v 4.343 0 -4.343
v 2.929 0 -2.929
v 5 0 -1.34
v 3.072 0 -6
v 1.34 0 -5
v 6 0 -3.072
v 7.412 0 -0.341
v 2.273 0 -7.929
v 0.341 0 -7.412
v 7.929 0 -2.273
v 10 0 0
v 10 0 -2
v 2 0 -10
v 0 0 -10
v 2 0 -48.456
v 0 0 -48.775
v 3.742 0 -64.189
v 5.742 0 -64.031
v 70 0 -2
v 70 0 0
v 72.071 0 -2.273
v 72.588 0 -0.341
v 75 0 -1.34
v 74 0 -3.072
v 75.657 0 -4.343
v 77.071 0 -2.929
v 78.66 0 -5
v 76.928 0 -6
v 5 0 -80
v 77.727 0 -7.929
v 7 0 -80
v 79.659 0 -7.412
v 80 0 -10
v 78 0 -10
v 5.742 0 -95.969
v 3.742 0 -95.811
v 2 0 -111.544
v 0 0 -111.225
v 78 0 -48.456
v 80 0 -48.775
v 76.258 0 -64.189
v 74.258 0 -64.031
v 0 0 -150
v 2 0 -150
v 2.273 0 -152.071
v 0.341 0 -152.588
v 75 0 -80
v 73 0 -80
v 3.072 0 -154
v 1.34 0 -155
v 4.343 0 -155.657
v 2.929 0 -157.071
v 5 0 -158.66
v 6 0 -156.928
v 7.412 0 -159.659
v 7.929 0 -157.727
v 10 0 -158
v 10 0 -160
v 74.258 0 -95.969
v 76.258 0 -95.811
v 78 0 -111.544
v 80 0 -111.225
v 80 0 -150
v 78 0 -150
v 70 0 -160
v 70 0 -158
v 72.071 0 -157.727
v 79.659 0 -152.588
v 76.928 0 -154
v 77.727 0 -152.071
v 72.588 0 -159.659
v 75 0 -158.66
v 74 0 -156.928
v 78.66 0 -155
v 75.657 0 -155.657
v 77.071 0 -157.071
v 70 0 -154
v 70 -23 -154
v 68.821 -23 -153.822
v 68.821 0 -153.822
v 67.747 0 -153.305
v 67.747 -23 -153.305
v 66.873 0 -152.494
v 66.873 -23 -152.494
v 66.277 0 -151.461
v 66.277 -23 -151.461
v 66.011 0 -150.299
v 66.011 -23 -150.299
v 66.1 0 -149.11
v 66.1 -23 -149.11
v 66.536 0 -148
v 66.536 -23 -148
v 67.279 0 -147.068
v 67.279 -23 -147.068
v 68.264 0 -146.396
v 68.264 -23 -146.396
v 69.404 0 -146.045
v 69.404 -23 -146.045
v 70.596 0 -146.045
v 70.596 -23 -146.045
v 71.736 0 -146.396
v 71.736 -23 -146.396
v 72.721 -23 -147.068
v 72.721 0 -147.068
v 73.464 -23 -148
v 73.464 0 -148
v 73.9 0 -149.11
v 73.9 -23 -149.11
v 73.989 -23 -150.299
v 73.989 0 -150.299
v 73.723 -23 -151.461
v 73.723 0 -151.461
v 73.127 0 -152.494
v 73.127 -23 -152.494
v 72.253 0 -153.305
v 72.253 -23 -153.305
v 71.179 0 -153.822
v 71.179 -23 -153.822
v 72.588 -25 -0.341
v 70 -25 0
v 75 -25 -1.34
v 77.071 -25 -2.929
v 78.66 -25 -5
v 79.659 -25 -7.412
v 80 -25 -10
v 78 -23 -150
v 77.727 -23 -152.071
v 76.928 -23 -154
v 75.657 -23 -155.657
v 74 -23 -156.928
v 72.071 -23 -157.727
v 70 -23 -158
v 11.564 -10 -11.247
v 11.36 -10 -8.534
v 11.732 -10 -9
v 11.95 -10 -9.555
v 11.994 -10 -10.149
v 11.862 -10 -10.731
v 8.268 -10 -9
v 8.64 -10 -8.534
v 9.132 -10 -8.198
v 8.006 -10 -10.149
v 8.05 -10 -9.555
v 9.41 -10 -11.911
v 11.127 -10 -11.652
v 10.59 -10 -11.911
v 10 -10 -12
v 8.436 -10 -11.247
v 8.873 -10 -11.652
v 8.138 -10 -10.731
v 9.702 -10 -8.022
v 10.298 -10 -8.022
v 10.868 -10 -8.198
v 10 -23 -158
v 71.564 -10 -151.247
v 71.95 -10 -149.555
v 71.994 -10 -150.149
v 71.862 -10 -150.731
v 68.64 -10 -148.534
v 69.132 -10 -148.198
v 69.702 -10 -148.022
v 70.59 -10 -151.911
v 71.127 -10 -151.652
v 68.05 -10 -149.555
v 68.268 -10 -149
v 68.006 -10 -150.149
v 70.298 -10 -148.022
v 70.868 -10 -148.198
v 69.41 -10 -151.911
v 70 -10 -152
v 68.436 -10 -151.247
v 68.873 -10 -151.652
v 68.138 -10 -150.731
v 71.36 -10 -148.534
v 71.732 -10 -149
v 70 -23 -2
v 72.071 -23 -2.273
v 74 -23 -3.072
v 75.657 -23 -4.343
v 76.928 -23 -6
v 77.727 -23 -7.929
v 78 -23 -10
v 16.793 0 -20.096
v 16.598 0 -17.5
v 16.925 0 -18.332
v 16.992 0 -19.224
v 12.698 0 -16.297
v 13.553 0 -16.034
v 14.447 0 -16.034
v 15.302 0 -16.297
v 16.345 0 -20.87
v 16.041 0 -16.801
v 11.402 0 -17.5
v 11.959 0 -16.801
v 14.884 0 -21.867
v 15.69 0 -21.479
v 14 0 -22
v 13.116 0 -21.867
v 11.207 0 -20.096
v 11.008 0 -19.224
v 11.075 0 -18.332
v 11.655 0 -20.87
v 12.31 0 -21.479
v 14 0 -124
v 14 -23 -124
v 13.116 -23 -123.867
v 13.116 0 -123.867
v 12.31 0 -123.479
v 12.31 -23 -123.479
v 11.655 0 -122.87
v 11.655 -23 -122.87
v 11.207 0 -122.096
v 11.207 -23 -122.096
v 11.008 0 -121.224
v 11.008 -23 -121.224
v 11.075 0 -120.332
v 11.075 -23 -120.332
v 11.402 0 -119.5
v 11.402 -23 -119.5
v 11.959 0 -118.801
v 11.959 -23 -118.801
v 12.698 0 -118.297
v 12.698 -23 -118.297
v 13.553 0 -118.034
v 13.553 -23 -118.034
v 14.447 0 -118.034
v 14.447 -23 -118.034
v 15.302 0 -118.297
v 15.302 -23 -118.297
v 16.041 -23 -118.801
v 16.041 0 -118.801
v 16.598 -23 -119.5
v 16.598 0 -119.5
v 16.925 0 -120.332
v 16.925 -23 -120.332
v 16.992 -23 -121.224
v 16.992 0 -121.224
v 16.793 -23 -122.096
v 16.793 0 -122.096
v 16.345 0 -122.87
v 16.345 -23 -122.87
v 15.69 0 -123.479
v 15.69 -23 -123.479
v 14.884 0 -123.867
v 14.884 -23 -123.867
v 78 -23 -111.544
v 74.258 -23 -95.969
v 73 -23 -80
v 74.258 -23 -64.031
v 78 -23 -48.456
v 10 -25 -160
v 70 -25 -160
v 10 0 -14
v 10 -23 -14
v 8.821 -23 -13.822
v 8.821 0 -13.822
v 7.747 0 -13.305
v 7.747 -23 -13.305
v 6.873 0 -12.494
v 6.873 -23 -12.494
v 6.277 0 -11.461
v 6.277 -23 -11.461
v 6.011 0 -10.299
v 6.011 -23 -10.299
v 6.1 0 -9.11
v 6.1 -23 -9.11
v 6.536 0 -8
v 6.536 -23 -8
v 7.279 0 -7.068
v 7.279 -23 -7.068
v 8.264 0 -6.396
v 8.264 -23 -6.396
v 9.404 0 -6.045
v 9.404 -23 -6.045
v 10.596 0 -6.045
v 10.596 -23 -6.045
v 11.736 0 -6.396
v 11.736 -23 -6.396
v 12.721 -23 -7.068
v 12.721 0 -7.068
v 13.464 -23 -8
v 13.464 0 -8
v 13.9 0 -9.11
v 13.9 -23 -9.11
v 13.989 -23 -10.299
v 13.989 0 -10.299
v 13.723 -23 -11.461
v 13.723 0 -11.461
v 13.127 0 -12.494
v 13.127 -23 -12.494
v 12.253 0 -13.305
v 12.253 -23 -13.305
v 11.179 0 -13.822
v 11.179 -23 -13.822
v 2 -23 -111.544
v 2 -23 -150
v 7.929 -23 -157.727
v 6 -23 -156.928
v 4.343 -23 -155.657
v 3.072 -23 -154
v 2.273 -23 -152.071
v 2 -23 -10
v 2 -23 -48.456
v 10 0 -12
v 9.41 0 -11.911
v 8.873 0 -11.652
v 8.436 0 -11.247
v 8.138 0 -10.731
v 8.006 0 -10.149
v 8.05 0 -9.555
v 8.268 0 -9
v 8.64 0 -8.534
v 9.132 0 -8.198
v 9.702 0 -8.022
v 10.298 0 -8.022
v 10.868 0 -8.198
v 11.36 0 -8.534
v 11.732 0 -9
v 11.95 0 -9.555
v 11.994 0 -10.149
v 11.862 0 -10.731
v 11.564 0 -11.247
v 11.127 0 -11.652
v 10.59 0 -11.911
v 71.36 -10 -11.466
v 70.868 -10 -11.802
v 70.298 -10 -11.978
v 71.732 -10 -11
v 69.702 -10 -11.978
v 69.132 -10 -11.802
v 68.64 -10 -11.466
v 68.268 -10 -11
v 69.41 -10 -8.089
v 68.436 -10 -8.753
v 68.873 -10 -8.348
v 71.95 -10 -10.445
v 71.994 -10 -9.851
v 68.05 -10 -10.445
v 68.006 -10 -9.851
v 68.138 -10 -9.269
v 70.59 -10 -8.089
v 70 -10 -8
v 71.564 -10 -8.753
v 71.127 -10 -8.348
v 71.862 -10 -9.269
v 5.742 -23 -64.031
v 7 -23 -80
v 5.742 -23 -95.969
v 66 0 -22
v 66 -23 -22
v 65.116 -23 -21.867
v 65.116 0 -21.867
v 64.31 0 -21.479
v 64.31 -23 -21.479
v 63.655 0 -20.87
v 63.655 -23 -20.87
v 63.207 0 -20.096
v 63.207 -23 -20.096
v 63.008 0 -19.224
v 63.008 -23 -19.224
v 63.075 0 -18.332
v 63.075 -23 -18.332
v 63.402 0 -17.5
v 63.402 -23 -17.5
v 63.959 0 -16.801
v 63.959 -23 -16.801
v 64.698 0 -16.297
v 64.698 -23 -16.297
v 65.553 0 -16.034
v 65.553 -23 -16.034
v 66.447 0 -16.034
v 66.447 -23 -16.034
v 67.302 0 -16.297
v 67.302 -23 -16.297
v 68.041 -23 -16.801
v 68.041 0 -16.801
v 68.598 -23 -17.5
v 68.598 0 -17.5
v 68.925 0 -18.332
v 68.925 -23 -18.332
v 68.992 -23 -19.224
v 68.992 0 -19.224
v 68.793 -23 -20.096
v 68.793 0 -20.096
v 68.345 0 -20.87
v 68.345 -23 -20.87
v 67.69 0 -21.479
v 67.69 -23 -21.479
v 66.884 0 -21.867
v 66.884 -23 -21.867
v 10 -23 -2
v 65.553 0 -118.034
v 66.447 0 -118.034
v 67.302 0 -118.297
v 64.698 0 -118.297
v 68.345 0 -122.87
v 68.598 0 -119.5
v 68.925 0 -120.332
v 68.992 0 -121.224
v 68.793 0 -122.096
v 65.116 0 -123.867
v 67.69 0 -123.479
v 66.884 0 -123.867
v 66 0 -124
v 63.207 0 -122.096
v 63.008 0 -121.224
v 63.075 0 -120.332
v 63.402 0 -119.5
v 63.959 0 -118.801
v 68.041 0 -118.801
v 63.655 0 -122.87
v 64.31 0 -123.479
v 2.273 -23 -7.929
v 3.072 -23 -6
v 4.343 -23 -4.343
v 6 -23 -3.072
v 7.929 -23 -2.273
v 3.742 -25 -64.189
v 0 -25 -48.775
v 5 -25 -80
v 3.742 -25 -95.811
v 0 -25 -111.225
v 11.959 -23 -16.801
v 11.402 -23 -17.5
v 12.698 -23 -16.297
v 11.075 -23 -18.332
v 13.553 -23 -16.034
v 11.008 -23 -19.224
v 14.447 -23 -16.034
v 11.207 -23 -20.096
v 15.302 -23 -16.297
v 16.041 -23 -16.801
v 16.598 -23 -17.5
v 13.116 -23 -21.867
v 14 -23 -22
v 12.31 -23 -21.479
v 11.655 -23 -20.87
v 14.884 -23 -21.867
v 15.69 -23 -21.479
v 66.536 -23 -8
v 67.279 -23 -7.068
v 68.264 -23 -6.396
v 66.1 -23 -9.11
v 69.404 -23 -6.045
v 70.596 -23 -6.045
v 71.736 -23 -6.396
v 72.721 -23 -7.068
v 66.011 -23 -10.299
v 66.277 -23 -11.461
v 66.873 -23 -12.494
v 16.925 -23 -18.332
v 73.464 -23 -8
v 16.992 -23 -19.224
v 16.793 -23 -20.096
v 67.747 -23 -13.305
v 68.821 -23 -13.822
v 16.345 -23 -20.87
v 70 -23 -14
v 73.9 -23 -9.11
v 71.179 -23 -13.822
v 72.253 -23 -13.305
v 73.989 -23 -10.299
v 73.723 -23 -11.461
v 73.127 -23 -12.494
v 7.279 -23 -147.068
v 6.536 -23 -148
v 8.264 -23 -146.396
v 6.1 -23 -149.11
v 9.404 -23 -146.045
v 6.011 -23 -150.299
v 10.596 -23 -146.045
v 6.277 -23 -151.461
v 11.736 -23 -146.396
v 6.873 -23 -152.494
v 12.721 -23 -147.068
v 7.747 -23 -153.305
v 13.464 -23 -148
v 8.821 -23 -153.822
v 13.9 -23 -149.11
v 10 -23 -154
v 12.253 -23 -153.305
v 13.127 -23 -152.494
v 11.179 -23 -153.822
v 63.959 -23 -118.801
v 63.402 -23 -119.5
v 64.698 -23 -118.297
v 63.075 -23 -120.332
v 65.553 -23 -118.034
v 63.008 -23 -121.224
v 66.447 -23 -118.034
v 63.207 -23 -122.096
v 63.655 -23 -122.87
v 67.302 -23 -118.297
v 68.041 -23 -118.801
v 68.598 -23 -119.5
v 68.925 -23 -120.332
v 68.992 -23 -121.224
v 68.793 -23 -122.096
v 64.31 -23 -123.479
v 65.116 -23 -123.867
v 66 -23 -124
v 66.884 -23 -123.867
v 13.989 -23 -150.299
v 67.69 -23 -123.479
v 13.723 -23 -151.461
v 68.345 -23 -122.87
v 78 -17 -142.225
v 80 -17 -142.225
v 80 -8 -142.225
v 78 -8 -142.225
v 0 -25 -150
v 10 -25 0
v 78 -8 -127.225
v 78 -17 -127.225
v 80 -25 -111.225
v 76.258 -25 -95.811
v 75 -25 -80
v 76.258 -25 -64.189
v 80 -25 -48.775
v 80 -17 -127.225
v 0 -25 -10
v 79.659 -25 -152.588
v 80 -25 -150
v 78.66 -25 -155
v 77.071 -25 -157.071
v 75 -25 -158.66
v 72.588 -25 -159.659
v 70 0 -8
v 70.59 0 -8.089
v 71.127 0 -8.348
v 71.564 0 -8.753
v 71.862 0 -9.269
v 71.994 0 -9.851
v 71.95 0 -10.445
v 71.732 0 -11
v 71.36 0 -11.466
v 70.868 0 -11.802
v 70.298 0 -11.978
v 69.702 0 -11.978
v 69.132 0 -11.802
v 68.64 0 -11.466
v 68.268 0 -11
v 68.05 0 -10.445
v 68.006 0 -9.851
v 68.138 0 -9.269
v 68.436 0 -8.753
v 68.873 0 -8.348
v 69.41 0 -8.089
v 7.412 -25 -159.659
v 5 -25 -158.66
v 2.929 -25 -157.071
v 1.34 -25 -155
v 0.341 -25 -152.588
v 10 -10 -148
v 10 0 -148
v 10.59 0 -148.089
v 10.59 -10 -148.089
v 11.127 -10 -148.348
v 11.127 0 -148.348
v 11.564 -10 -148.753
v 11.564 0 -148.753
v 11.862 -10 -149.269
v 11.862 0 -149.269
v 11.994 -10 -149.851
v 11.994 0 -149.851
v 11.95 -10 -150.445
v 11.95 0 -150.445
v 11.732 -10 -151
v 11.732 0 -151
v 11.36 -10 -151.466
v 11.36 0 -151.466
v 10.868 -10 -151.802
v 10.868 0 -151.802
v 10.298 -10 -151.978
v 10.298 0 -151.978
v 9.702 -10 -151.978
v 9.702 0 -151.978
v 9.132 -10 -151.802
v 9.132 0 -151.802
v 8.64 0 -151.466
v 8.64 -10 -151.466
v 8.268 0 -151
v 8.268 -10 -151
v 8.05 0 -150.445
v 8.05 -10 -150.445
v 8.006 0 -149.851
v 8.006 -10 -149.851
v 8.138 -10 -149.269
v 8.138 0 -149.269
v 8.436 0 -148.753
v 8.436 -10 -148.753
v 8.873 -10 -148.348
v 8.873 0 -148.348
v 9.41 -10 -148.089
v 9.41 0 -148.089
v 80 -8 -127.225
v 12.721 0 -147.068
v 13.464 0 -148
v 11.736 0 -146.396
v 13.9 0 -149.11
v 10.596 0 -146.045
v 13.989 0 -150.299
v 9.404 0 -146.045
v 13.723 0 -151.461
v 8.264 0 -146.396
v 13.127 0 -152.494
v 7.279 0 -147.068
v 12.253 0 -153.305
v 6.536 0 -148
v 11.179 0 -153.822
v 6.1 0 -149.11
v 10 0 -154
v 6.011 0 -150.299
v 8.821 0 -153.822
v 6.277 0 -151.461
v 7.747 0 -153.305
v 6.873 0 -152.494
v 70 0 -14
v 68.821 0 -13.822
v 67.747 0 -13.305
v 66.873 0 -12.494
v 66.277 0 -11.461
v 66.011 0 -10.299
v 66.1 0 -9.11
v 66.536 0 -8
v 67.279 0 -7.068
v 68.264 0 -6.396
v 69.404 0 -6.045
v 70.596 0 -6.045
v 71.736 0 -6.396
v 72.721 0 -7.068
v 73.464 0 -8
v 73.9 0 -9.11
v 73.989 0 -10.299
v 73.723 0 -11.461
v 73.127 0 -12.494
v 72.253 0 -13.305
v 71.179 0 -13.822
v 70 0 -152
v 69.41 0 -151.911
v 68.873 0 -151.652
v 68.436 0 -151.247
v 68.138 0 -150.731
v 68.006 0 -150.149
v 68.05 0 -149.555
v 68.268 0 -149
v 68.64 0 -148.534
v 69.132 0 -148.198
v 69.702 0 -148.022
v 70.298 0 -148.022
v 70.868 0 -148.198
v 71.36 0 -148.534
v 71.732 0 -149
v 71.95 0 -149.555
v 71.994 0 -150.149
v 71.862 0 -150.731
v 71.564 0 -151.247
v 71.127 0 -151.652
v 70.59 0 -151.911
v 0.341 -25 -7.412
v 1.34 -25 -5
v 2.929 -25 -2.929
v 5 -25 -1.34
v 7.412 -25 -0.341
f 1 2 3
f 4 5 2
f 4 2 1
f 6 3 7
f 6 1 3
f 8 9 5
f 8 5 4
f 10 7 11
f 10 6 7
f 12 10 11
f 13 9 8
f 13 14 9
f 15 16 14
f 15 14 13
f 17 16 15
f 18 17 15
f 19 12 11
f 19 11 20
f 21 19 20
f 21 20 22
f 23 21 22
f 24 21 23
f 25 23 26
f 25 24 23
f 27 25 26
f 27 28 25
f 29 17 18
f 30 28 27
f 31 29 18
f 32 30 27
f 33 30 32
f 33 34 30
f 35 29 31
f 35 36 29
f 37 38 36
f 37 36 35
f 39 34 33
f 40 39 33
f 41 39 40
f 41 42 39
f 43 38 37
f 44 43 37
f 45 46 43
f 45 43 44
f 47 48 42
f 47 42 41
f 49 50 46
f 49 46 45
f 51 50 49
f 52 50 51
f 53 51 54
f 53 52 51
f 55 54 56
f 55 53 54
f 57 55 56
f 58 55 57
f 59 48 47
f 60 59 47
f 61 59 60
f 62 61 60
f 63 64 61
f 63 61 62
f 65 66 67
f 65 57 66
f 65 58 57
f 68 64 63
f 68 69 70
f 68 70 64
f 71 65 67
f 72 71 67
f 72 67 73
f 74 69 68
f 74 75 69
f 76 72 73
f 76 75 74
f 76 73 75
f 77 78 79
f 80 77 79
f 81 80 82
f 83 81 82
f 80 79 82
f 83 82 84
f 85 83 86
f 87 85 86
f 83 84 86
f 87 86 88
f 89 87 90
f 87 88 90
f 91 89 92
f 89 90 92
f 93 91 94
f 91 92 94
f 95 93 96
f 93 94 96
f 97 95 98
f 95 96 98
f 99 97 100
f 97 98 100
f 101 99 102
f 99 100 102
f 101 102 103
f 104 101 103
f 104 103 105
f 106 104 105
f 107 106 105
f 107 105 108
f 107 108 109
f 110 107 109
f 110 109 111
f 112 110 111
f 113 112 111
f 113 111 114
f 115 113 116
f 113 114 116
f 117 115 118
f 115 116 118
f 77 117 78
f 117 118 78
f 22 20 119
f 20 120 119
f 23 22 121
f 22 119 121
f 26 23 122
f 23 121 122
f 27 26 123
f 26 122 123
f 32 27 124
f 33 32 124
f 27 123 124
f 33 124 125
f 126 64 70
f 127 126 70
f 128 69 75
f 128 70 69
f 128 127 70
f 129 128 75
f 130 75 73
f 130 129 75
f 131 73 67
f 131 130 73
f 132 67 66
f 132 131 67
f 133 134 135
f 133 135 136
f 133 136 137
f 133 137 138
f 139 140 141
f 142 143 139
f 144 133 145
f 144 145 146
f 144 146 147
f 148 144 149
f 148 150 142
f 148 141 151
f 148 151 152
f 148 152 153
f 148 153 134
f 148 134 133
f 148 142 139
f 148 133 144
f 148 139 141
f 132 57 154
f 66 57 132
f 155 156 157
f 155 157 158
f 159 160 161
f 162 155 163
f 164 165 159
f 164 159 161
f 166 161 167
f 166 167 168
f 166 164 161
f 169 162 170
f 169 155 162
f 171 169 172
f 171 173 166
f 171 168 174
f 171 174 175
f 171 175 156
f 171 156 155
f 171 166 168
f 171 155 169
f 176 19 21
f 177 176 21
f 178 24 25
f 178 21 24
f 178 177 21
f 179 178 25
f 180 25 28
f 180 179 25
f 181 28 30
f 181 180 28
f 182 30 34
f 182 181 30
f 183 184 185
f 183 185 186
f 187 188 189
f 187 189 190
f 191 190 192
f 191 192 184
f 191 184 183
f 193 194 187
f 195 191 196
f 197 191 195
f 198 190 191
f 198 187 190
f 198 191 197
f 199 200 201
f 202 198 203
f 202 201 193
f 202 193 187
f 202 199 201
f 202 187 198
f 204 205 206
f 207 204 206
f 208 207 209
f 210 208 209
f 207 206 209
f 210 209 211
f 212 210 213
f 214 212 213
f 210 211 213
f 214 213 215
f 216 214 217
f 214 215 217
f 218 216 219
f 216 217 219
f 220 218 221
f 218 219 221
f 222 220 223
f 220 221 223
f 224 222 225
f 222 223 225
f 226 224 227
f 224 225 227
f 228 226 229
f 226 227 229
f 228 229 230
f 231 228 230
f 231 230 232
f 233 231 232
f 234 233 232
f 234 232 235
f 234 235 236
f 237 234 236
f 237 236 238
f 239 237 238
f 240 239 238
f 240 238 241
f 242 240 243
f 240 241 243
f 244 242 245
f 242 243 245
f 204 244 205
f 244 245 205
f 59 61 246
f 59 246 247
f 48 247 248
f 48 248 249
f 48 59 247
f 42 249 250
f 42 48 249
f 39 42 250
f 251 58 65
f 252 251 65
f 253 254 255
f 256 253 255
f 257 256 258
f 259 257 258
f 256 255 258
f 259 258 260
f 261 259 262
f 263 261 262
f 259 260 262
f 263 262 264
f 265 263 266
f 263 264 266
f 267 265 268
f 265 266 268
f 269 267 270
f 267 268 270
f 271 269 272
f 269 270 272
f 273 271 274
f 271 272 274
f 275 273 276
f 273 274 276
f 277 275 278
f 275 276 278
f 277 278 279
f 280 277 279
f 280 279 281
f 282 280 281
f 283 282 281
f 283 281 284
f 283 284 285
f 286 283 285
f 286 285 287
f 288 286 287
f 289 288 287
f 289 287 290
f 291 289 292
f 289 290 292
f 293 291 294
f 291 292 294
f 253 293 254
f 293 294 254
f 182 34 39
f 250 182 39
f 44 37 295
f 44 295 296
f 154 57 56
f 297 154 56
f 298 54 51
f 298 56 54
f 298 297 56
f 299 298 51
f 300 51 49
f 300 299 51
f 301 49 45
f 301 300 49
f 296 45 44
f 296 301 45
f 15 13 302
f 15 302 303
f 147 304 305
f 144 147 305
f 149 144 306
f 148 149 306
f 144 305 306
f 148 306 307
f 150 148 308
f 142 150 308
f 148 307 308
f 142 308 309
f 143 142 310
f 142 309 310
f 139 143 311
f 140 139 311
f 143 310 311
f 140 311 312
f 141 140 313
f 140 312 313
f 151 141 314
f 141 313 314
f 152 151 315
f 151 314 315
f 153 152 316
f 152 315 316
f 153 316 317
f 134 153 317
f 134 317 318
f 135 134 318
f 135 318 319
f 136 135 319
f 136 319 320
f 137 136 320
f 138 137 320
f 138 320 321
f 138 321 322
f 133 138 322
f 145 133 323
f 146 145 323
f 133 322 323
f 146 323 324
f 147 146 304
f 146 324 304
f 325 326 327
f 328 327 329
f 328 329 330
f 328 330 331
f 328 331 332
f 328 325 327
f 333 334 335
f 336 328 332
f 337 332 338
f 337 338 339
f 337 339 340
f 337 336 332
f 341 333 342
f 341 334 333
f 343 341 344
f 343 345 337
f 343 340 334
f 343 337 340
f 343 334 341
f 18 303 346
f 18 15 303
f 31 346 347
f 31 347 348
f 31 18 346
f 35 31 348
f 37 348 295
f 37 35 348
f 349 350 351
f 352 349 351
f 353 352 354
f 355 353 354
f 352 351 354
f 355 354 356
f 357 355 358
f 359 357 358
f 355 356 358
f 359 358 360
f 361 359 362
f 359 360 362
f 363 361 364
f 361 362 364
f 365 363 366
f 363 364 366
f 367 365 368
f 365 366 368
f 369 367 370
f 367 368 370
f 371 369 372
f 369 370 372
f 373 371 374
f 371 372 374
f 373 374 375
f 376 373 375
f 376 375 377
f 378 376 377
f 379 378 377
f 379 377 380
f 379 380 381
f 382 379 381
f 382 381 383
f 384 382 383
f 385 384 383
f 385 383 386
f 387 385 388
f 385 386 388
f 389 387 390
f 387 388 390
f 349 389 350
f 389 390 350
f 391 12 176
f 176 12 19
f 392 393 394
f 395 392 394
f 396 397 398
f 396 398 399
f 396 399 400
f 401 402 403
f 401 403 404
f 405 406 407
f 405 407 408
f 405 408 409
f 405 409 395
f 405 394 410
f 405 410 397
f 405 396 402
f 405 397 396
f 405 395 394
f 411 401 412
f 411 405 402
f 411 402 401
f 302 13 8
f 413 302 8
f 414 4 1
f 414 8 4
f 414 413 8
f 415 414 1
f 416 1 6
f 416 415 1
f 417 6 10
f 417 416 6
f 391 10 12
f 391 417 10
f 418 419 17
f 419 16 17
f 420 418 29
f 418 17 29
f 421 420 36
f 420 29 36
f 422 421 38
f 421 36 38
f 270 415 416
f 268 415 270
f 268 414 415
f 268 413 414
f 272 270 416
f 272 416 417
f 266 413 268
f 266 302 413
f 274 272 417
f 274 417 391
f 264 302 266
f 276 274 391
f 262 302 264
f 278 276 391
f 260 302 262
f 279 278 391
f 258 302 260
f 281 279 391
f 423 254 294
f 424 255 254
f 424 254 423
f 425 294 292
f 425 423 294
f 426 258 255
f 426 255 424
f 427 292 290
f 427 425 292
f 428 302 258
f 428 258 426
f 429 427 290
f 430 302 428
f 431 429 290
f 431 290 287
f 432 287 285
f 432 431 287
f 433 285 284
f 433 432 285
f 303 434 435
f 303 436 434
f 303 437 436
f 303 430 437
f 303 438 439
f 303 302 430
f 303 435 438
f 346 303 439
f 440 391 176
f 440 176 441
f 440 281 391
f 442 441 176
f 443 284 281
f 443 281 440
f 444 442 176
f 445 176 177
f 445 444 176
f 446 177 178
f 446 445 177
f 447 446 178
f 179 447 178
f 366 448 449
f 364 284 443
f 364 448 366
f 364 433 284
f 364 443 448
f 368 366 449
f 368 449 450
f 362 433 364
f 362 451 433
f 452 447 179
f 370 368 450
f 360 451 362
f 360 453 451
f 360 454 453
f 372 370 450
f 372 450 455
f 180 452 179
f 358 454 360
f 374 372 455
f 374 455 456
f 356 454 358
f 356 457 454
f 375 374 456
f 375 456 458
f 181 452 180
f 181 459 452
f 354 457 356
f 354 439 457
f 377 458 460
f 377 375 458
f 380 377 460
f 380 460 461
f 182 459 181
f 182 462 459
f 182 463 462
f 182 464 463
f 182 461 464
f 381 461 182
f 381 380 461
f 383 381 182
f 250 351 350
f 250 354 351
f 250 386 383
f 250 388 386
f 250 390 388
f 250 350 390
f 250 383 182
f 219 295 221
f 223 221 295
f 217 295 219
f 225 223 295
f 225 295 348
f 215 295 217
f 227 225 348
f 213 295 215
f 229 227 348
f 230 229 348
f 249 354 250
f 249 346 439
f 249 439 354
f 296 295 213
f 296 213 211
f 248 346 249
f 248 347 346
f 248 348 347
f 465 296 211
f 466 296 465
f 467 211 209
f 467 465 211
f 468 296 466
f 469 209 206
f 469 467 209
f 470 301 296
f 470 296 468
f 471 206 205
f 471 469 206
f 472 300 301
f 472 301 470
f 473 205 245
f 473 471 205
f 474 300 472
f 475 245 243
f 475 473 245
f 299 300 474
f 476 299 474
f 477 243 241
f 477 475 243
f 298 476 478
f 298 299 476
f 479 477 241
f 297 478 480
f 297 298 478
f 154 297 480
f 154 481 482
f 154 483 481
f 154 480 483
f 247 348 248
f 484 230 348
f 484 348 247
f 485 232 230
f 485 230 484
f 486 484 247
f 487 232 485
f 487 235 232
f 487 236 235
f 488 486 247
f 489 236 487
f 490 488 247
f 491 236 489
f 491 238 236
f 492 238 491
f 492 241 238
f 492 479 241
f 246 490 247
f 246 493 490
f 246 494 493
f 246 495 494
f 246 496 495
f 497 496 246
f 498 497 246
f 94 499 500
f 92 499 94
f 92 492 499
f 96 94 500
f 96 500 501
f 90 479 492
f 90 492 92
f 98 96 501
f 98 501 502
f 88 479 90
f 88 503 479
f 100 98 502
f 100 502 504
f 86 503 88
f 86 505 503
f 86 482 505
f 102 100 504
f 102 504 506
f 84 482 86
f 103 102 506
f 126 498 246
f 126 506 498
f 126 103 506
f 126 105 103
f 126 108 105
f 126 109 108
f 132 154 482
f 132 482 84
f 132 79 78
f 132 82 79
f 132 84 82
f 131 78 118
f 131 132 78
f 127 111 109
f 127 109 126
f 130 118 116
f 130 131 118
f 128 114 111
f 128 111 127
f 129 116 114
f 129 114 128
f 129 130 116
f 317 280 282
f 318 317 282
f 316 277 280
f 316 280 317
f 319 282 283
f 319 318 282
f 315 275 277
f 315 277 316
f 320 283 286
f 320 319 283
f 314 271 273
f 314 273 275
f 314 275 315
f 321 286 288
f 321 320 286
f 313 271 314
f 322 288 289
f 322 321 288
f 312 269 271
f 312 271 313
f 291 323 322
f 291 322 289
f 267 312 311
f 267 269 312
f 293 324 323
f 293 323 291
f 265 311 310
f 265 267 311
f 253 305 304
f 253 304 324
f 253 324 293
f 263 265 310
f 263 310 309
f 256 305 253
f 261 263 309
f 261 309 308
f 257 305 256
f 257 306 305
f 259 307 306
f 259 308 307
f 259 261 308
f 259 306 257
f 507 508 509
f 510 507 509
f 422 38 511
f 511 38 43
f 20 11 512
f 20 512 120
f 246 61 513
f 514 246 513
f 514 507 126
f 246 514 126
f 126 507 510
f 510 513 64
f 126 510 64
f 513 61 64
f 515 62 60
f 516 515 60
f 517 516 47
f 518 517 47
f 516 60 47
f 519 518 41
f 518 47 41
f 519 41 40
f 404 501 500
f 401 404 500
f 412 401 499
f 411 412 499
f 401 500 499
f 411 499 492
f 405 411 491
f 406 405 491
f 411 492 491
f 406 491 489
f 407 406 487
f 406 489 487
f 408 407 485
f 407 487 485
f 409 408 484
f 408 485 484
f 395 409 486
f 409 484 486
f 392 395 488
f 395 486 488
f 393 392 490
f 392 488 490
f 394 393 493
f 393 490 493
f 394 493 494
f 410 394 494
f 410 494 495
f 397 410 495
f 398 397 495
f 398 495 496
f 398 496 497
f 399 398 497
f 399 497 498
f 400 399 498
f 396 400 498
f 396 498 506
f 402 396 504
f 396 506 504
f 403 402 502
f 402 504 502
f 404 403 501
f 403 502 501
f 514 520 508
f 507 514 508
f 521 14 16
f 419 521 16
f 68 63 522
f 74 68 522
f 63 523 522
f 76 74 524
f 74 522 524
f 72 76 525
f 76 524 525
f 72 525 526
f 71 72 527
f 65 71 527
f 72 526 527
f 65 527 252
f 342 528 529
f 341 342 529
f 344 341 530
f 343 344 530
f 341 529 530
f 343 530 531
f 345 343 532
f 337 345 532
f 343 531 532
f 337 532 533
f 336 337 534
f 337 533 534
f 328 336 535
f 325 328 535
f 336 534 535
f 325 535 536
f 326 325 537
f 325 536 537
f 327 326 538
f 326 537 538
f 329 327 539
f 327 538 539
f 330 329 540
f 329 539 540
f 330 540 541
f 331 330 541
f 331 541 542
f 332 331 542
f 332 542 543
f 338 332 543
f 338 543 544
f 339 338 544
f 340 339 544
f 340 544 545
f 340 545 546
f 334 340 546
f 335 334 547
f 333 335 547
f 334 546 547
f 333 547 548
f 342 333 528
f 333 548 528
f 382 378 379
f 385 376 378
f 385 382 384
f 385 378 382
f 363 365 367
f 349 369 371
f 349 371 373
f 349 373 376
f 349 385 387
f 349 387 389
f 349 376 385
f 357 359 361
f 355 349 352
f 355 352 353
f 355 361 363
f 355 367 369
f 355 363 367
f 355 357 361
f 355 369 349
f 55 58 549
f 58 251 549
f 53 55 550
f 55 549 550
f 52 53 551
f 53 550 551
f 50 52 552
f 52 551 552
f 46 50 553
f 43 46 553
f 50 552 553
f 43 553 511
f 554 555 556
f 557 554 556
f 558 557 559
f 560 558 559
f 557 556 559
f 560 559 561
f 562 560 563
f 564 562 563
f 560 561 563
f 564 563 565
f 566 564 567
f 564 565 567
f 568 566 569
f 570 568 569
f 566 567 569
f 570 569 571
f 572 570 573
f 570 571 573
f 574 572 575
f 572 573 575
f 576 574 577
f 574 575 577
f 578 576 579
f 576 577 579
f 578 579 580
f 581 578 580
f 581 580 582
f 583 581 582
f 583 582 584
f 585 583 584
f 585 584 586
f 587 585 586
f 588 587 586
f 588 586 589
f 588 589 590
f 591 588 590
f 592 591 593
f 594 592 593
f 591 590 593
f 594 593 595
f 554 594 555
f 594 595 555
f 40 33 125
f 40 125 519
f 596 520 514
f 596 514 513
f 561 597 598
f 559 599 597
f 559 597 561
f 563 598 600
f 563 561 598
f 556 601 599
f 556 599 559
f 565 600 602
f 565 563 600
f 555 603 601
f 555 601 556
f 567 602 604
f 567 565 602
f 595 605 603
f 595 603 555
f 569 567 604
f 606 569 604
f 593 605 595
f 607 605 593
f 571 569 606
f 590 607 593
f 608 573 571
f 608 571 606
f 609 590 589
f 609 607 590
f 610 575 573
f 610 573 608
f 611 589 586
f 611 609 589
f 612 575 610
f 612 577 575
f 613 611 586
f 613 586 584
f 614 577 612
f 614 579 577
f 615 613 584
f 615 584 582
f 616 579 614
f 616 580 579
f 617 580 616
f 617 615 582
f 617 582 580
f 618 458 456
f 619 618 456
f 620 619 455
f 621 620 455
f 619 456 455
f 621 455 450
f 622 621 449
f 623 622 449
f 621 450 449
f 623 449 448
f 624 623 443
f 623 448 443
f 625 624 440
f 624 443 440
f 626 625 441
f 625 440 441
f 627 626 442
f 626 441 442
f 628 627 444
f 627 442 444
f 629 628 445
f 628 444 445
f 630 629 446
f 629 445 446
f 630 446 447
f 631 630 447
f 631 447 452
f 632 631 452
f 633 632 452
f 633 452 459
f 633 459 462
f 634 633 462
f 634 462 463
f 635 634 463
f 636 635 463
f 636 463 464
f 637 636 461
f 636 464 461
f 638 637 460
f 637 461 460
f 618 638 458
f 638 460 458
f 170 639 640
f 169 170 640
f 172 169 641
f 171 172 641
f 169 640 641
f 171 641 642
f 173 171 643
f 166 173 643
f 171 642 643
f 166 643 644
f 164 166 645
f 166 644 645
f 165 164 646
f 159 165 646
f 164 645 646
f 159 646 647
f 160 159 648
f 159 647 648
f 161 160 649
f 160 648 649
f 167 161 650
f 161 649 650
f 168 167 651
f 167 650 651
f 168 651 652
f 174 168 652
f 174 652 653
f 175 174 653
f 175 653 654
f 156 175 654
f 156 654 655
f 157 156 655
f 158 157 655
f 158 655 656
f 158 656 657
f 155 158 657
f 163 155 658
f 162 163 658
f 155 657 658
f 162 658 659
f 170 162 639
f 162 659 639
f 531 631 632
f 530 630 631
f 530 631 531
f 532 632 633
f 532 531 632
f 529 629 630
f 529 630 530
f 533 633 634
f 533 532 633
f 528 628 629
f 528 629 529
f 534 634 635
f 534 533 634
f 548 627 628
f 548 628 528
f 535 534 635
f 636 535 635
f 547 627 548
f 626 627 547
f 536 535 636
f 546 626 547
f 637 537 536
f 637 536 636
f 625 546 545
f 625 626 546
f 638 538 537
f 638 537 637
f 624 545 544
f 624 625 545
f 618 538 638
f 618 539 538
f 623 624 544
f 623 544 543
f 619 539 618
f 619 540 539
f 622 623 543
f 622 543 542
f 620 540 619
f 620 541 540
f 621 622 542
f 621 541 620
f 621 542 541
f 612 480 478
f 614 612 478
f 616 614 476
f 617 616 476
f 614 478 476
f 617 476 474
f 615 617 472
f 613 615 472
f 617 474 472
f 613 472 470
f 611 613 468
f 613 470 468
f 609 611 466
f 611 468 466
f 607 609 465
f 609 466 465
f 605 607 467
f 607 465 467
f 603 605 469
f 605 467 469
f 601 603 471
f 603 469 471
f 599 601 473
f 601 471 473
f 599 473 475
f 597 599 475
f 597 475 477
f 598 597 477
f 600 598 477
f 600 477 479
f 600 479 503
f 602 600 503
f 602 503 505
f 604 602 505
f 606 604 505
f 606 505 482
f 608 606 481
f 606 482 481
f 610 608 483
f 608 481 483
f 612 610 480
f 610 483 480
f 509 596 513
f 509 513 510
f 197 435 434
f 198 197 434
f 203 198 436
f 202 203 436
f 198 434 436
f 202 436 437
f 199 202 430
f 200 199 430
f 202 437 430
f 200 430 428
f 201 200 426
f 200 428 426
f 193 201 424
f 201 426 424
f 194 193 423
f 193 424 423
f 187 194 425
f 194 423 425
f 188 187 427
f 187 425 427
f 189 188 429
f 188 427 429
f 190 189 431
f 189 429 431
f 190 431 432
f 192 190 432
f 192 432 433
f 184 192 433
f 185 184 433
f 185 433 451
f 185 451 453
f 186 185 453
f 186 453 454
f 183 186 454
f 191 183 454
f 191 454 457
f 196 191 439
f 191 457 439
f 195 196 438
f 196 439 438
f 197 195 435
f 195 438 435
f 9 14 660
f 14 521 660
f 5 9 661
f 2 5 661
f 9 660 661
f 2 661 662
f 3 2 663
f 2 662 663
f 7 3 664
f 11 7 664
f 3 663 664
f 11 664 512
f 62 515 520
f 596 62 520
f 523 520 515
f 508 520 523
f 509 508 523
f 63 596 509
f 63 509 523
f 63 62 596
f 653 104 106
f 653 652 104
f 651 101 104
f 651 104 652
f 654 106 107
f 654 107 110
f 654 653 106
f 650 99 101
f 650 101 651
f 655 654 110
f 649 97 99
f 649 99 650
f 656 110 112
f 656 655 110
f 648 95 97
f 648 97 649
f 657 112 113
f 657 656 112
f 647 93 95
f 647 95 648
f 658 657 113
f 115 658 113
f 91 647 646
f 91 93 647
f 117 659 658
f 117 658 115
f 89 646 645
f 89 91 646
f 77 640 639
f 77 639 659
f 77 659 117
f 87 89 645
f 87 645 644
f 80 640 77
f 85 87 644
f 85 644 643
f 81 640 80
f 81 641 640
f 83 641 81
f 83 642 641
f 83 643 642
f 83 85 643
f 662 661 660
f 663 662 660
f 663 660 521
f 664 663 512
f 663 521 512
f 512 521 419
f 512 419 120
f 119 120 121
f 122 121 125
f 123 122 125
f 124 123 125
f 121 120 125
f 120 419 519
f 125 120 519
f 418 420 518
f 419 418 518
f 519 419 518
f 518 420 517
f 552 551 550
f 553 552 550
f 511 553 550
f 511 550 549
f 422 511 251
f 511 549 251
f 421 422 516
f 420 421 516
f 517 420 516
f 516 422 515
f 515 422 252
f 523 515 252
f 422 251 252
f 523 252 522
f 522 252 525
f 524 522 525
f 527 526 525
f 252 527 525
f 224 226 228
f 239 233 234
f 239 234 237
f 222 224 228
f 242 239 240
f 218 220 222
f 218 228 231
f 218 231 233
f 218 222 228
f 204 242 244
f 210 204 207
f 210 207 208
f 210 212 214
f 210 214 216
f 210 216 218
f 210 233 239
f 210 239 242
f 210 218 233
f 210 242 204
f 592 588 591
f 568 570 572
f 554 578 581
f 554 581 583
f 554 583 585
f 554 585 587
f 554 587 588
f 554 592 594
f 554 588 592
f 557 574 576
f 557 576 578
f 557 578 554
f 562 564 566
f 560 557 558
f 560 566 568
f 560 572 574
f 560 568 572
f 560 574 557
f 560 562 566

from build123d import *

# Parameters (mm, degrees)
SKETCH1_W           = 80
SKETCH1_H           = 160
BOSS_EXTRUDE1_DEPTH = 25
SKETCH2_R           = 100
CUT_EXTRUDE1_DEPTH  = 181.623918682
FILLET1_R           = 10
SHELL1_T            = -2
SKETCH3_R           = 4
BOSS_EXTRUDE2_DEPTH = 23
SKETCH6_R           = 2
CUT_EXTRUDE2_DEPTH  = 10
SKETCH7_R           = 3
BOSS_EXTRUDE3_DEPTH = 23
SKETCH8_W           = 15
SKETCH8_H           = 9
CUT_EXTRUDE3_DEPTH  = 10


with BuildPart() as part:
    # Sketch1 → Boss-Extrude1 (new body)
    with BuildSketch(Plane(origin=(0, 0, 0), x_dir=(1, 0, 0), z_dir=(0, 1, 0))):
        with Locations((40, 80)):
            Rectangle(SKETCH1_W, SKETCH1_H)
    extrude(amount=-BOSS_EXTRUDE1_DEPTH)

    # Sketch2 → Cut-Extrude1 (cut, through all)
    with BuildSketch(Plane(origin=(0, 0, 0), x_dir=(1, 0, 0), z_dir=(0, 1, 0))):
        with Locations((-95, 80)):
            Circle(SKETCH2_R)
        with Locations((175, 80)):
            Circle(SKETCH2_R)
    extrude(amount=-CUT_EXTRUDE1_DEPTH, mode=Mode.SUBTRACT)

    # Fillet1
    fillet1_edges = [part.edges().sort_by_distance(p)[0] for p in [
        (0, -12.5, -160),
        (80, -12.5, -160),
        (80, -12.5, 0),
        (0, -12.5, 0),
    ]]
    fillet(fillet1_edges, radius=FILLET1_R)

    # Shell1
    shell1_openings = [part.faces().sort_by_distance(p)[0] for p in [
        (40, 0, -80),
    ]]
    offset(amount=SHELL1_T, openings=shell1_openings, kind=Kind.INTERSECTION)

    # Sketch3 → Boss-Extrude2 (add, through all)
    with BuildSketch(Plane(origin=(0, -23, 0), x_dir=(1, 0, 0), z_dir=(0, 1, 0))):
        with Locations(Location((10, 150, 0), (0, 0, 90))):
            Circle(SKETCH3_R)
        with Locations(Location((70, 150, 0), (0, 0, 90))):
            Circle(SKETCH3_R)
        with Locations(Location((70, 10, 0), (0, 0, 90))):
            Circle(SKETCH3_R)
        with Locations(Location((10, 10, 0), (0, 0, 90))):
            Circle(SKETCH3_R)
    extrude(amount=BOSS_EXTRUDE2_DEPTH)

    # Sketch6 → Cut-Extrude2 (cut)
    with BuildSketch(Plane(origin=(0, 0, 0), x_dir=(1, 0, 0), z_dir=(0, 1, 0))):
        with Locations(Location((10, 150, 0), (0, 0, 270))):
            Circle(SKETCH6_R)
        with Locations(Location((70, 150, 0), (0, 0, 90))):
            Circle(SKETCH6_R)
        with Locations(Location((70, 10, 0), (0, 0, 270))):
            Circle(SKETCH6_R)
        with Locations(Location((10, 10, 0), (0, 0, 90))):
            Circle(SKETCH6_R)
    extrude(amount=-CUT_EXTRUDE2_DEPTH, mode=Mode.SUBTRACT)

    # Sketch7 → Boss-Extrude3 (add, through all)
    with BuildSketch(Plane(origin=(0, -23, 0), x_dir=(1, 0, 0), z_dir=(0, 1, 0))):
        with Locations(Location((14, 121, 0), (0, 0, 90))):
            Circle(SKETCH7_R)
        with Locations(Location((66, 121, 0), (0, 0, 90))):
            Circle(SKETCH7_R)
        with Locations(Location((14, 19, 0), (0, 0, 90))):
            Circle(SKETCH7_R)
        with Locations(Location((66, 19, 0), (0, 0, 90))):
            Circle(SKETCH7_R)
    extrude(amount=BOSS_EXTRUDE3_DEPTH)

    # Sketch8 → Cut-Extrude3 (cut)
    with BuildSketch(Plane(origin=(80, 0, 0), x_dir=(0, 0, -1), z_dir=(1, 0, 0))):
        with Locations((134.724989992, -12.5)):
            Rectangle(SKETCH8_W, SKETCH8_H)
    extrude(amount=-CUT_EXTRUDE3_DEPTH, mode=Mode.SUBTRACT)


solid = part.part
